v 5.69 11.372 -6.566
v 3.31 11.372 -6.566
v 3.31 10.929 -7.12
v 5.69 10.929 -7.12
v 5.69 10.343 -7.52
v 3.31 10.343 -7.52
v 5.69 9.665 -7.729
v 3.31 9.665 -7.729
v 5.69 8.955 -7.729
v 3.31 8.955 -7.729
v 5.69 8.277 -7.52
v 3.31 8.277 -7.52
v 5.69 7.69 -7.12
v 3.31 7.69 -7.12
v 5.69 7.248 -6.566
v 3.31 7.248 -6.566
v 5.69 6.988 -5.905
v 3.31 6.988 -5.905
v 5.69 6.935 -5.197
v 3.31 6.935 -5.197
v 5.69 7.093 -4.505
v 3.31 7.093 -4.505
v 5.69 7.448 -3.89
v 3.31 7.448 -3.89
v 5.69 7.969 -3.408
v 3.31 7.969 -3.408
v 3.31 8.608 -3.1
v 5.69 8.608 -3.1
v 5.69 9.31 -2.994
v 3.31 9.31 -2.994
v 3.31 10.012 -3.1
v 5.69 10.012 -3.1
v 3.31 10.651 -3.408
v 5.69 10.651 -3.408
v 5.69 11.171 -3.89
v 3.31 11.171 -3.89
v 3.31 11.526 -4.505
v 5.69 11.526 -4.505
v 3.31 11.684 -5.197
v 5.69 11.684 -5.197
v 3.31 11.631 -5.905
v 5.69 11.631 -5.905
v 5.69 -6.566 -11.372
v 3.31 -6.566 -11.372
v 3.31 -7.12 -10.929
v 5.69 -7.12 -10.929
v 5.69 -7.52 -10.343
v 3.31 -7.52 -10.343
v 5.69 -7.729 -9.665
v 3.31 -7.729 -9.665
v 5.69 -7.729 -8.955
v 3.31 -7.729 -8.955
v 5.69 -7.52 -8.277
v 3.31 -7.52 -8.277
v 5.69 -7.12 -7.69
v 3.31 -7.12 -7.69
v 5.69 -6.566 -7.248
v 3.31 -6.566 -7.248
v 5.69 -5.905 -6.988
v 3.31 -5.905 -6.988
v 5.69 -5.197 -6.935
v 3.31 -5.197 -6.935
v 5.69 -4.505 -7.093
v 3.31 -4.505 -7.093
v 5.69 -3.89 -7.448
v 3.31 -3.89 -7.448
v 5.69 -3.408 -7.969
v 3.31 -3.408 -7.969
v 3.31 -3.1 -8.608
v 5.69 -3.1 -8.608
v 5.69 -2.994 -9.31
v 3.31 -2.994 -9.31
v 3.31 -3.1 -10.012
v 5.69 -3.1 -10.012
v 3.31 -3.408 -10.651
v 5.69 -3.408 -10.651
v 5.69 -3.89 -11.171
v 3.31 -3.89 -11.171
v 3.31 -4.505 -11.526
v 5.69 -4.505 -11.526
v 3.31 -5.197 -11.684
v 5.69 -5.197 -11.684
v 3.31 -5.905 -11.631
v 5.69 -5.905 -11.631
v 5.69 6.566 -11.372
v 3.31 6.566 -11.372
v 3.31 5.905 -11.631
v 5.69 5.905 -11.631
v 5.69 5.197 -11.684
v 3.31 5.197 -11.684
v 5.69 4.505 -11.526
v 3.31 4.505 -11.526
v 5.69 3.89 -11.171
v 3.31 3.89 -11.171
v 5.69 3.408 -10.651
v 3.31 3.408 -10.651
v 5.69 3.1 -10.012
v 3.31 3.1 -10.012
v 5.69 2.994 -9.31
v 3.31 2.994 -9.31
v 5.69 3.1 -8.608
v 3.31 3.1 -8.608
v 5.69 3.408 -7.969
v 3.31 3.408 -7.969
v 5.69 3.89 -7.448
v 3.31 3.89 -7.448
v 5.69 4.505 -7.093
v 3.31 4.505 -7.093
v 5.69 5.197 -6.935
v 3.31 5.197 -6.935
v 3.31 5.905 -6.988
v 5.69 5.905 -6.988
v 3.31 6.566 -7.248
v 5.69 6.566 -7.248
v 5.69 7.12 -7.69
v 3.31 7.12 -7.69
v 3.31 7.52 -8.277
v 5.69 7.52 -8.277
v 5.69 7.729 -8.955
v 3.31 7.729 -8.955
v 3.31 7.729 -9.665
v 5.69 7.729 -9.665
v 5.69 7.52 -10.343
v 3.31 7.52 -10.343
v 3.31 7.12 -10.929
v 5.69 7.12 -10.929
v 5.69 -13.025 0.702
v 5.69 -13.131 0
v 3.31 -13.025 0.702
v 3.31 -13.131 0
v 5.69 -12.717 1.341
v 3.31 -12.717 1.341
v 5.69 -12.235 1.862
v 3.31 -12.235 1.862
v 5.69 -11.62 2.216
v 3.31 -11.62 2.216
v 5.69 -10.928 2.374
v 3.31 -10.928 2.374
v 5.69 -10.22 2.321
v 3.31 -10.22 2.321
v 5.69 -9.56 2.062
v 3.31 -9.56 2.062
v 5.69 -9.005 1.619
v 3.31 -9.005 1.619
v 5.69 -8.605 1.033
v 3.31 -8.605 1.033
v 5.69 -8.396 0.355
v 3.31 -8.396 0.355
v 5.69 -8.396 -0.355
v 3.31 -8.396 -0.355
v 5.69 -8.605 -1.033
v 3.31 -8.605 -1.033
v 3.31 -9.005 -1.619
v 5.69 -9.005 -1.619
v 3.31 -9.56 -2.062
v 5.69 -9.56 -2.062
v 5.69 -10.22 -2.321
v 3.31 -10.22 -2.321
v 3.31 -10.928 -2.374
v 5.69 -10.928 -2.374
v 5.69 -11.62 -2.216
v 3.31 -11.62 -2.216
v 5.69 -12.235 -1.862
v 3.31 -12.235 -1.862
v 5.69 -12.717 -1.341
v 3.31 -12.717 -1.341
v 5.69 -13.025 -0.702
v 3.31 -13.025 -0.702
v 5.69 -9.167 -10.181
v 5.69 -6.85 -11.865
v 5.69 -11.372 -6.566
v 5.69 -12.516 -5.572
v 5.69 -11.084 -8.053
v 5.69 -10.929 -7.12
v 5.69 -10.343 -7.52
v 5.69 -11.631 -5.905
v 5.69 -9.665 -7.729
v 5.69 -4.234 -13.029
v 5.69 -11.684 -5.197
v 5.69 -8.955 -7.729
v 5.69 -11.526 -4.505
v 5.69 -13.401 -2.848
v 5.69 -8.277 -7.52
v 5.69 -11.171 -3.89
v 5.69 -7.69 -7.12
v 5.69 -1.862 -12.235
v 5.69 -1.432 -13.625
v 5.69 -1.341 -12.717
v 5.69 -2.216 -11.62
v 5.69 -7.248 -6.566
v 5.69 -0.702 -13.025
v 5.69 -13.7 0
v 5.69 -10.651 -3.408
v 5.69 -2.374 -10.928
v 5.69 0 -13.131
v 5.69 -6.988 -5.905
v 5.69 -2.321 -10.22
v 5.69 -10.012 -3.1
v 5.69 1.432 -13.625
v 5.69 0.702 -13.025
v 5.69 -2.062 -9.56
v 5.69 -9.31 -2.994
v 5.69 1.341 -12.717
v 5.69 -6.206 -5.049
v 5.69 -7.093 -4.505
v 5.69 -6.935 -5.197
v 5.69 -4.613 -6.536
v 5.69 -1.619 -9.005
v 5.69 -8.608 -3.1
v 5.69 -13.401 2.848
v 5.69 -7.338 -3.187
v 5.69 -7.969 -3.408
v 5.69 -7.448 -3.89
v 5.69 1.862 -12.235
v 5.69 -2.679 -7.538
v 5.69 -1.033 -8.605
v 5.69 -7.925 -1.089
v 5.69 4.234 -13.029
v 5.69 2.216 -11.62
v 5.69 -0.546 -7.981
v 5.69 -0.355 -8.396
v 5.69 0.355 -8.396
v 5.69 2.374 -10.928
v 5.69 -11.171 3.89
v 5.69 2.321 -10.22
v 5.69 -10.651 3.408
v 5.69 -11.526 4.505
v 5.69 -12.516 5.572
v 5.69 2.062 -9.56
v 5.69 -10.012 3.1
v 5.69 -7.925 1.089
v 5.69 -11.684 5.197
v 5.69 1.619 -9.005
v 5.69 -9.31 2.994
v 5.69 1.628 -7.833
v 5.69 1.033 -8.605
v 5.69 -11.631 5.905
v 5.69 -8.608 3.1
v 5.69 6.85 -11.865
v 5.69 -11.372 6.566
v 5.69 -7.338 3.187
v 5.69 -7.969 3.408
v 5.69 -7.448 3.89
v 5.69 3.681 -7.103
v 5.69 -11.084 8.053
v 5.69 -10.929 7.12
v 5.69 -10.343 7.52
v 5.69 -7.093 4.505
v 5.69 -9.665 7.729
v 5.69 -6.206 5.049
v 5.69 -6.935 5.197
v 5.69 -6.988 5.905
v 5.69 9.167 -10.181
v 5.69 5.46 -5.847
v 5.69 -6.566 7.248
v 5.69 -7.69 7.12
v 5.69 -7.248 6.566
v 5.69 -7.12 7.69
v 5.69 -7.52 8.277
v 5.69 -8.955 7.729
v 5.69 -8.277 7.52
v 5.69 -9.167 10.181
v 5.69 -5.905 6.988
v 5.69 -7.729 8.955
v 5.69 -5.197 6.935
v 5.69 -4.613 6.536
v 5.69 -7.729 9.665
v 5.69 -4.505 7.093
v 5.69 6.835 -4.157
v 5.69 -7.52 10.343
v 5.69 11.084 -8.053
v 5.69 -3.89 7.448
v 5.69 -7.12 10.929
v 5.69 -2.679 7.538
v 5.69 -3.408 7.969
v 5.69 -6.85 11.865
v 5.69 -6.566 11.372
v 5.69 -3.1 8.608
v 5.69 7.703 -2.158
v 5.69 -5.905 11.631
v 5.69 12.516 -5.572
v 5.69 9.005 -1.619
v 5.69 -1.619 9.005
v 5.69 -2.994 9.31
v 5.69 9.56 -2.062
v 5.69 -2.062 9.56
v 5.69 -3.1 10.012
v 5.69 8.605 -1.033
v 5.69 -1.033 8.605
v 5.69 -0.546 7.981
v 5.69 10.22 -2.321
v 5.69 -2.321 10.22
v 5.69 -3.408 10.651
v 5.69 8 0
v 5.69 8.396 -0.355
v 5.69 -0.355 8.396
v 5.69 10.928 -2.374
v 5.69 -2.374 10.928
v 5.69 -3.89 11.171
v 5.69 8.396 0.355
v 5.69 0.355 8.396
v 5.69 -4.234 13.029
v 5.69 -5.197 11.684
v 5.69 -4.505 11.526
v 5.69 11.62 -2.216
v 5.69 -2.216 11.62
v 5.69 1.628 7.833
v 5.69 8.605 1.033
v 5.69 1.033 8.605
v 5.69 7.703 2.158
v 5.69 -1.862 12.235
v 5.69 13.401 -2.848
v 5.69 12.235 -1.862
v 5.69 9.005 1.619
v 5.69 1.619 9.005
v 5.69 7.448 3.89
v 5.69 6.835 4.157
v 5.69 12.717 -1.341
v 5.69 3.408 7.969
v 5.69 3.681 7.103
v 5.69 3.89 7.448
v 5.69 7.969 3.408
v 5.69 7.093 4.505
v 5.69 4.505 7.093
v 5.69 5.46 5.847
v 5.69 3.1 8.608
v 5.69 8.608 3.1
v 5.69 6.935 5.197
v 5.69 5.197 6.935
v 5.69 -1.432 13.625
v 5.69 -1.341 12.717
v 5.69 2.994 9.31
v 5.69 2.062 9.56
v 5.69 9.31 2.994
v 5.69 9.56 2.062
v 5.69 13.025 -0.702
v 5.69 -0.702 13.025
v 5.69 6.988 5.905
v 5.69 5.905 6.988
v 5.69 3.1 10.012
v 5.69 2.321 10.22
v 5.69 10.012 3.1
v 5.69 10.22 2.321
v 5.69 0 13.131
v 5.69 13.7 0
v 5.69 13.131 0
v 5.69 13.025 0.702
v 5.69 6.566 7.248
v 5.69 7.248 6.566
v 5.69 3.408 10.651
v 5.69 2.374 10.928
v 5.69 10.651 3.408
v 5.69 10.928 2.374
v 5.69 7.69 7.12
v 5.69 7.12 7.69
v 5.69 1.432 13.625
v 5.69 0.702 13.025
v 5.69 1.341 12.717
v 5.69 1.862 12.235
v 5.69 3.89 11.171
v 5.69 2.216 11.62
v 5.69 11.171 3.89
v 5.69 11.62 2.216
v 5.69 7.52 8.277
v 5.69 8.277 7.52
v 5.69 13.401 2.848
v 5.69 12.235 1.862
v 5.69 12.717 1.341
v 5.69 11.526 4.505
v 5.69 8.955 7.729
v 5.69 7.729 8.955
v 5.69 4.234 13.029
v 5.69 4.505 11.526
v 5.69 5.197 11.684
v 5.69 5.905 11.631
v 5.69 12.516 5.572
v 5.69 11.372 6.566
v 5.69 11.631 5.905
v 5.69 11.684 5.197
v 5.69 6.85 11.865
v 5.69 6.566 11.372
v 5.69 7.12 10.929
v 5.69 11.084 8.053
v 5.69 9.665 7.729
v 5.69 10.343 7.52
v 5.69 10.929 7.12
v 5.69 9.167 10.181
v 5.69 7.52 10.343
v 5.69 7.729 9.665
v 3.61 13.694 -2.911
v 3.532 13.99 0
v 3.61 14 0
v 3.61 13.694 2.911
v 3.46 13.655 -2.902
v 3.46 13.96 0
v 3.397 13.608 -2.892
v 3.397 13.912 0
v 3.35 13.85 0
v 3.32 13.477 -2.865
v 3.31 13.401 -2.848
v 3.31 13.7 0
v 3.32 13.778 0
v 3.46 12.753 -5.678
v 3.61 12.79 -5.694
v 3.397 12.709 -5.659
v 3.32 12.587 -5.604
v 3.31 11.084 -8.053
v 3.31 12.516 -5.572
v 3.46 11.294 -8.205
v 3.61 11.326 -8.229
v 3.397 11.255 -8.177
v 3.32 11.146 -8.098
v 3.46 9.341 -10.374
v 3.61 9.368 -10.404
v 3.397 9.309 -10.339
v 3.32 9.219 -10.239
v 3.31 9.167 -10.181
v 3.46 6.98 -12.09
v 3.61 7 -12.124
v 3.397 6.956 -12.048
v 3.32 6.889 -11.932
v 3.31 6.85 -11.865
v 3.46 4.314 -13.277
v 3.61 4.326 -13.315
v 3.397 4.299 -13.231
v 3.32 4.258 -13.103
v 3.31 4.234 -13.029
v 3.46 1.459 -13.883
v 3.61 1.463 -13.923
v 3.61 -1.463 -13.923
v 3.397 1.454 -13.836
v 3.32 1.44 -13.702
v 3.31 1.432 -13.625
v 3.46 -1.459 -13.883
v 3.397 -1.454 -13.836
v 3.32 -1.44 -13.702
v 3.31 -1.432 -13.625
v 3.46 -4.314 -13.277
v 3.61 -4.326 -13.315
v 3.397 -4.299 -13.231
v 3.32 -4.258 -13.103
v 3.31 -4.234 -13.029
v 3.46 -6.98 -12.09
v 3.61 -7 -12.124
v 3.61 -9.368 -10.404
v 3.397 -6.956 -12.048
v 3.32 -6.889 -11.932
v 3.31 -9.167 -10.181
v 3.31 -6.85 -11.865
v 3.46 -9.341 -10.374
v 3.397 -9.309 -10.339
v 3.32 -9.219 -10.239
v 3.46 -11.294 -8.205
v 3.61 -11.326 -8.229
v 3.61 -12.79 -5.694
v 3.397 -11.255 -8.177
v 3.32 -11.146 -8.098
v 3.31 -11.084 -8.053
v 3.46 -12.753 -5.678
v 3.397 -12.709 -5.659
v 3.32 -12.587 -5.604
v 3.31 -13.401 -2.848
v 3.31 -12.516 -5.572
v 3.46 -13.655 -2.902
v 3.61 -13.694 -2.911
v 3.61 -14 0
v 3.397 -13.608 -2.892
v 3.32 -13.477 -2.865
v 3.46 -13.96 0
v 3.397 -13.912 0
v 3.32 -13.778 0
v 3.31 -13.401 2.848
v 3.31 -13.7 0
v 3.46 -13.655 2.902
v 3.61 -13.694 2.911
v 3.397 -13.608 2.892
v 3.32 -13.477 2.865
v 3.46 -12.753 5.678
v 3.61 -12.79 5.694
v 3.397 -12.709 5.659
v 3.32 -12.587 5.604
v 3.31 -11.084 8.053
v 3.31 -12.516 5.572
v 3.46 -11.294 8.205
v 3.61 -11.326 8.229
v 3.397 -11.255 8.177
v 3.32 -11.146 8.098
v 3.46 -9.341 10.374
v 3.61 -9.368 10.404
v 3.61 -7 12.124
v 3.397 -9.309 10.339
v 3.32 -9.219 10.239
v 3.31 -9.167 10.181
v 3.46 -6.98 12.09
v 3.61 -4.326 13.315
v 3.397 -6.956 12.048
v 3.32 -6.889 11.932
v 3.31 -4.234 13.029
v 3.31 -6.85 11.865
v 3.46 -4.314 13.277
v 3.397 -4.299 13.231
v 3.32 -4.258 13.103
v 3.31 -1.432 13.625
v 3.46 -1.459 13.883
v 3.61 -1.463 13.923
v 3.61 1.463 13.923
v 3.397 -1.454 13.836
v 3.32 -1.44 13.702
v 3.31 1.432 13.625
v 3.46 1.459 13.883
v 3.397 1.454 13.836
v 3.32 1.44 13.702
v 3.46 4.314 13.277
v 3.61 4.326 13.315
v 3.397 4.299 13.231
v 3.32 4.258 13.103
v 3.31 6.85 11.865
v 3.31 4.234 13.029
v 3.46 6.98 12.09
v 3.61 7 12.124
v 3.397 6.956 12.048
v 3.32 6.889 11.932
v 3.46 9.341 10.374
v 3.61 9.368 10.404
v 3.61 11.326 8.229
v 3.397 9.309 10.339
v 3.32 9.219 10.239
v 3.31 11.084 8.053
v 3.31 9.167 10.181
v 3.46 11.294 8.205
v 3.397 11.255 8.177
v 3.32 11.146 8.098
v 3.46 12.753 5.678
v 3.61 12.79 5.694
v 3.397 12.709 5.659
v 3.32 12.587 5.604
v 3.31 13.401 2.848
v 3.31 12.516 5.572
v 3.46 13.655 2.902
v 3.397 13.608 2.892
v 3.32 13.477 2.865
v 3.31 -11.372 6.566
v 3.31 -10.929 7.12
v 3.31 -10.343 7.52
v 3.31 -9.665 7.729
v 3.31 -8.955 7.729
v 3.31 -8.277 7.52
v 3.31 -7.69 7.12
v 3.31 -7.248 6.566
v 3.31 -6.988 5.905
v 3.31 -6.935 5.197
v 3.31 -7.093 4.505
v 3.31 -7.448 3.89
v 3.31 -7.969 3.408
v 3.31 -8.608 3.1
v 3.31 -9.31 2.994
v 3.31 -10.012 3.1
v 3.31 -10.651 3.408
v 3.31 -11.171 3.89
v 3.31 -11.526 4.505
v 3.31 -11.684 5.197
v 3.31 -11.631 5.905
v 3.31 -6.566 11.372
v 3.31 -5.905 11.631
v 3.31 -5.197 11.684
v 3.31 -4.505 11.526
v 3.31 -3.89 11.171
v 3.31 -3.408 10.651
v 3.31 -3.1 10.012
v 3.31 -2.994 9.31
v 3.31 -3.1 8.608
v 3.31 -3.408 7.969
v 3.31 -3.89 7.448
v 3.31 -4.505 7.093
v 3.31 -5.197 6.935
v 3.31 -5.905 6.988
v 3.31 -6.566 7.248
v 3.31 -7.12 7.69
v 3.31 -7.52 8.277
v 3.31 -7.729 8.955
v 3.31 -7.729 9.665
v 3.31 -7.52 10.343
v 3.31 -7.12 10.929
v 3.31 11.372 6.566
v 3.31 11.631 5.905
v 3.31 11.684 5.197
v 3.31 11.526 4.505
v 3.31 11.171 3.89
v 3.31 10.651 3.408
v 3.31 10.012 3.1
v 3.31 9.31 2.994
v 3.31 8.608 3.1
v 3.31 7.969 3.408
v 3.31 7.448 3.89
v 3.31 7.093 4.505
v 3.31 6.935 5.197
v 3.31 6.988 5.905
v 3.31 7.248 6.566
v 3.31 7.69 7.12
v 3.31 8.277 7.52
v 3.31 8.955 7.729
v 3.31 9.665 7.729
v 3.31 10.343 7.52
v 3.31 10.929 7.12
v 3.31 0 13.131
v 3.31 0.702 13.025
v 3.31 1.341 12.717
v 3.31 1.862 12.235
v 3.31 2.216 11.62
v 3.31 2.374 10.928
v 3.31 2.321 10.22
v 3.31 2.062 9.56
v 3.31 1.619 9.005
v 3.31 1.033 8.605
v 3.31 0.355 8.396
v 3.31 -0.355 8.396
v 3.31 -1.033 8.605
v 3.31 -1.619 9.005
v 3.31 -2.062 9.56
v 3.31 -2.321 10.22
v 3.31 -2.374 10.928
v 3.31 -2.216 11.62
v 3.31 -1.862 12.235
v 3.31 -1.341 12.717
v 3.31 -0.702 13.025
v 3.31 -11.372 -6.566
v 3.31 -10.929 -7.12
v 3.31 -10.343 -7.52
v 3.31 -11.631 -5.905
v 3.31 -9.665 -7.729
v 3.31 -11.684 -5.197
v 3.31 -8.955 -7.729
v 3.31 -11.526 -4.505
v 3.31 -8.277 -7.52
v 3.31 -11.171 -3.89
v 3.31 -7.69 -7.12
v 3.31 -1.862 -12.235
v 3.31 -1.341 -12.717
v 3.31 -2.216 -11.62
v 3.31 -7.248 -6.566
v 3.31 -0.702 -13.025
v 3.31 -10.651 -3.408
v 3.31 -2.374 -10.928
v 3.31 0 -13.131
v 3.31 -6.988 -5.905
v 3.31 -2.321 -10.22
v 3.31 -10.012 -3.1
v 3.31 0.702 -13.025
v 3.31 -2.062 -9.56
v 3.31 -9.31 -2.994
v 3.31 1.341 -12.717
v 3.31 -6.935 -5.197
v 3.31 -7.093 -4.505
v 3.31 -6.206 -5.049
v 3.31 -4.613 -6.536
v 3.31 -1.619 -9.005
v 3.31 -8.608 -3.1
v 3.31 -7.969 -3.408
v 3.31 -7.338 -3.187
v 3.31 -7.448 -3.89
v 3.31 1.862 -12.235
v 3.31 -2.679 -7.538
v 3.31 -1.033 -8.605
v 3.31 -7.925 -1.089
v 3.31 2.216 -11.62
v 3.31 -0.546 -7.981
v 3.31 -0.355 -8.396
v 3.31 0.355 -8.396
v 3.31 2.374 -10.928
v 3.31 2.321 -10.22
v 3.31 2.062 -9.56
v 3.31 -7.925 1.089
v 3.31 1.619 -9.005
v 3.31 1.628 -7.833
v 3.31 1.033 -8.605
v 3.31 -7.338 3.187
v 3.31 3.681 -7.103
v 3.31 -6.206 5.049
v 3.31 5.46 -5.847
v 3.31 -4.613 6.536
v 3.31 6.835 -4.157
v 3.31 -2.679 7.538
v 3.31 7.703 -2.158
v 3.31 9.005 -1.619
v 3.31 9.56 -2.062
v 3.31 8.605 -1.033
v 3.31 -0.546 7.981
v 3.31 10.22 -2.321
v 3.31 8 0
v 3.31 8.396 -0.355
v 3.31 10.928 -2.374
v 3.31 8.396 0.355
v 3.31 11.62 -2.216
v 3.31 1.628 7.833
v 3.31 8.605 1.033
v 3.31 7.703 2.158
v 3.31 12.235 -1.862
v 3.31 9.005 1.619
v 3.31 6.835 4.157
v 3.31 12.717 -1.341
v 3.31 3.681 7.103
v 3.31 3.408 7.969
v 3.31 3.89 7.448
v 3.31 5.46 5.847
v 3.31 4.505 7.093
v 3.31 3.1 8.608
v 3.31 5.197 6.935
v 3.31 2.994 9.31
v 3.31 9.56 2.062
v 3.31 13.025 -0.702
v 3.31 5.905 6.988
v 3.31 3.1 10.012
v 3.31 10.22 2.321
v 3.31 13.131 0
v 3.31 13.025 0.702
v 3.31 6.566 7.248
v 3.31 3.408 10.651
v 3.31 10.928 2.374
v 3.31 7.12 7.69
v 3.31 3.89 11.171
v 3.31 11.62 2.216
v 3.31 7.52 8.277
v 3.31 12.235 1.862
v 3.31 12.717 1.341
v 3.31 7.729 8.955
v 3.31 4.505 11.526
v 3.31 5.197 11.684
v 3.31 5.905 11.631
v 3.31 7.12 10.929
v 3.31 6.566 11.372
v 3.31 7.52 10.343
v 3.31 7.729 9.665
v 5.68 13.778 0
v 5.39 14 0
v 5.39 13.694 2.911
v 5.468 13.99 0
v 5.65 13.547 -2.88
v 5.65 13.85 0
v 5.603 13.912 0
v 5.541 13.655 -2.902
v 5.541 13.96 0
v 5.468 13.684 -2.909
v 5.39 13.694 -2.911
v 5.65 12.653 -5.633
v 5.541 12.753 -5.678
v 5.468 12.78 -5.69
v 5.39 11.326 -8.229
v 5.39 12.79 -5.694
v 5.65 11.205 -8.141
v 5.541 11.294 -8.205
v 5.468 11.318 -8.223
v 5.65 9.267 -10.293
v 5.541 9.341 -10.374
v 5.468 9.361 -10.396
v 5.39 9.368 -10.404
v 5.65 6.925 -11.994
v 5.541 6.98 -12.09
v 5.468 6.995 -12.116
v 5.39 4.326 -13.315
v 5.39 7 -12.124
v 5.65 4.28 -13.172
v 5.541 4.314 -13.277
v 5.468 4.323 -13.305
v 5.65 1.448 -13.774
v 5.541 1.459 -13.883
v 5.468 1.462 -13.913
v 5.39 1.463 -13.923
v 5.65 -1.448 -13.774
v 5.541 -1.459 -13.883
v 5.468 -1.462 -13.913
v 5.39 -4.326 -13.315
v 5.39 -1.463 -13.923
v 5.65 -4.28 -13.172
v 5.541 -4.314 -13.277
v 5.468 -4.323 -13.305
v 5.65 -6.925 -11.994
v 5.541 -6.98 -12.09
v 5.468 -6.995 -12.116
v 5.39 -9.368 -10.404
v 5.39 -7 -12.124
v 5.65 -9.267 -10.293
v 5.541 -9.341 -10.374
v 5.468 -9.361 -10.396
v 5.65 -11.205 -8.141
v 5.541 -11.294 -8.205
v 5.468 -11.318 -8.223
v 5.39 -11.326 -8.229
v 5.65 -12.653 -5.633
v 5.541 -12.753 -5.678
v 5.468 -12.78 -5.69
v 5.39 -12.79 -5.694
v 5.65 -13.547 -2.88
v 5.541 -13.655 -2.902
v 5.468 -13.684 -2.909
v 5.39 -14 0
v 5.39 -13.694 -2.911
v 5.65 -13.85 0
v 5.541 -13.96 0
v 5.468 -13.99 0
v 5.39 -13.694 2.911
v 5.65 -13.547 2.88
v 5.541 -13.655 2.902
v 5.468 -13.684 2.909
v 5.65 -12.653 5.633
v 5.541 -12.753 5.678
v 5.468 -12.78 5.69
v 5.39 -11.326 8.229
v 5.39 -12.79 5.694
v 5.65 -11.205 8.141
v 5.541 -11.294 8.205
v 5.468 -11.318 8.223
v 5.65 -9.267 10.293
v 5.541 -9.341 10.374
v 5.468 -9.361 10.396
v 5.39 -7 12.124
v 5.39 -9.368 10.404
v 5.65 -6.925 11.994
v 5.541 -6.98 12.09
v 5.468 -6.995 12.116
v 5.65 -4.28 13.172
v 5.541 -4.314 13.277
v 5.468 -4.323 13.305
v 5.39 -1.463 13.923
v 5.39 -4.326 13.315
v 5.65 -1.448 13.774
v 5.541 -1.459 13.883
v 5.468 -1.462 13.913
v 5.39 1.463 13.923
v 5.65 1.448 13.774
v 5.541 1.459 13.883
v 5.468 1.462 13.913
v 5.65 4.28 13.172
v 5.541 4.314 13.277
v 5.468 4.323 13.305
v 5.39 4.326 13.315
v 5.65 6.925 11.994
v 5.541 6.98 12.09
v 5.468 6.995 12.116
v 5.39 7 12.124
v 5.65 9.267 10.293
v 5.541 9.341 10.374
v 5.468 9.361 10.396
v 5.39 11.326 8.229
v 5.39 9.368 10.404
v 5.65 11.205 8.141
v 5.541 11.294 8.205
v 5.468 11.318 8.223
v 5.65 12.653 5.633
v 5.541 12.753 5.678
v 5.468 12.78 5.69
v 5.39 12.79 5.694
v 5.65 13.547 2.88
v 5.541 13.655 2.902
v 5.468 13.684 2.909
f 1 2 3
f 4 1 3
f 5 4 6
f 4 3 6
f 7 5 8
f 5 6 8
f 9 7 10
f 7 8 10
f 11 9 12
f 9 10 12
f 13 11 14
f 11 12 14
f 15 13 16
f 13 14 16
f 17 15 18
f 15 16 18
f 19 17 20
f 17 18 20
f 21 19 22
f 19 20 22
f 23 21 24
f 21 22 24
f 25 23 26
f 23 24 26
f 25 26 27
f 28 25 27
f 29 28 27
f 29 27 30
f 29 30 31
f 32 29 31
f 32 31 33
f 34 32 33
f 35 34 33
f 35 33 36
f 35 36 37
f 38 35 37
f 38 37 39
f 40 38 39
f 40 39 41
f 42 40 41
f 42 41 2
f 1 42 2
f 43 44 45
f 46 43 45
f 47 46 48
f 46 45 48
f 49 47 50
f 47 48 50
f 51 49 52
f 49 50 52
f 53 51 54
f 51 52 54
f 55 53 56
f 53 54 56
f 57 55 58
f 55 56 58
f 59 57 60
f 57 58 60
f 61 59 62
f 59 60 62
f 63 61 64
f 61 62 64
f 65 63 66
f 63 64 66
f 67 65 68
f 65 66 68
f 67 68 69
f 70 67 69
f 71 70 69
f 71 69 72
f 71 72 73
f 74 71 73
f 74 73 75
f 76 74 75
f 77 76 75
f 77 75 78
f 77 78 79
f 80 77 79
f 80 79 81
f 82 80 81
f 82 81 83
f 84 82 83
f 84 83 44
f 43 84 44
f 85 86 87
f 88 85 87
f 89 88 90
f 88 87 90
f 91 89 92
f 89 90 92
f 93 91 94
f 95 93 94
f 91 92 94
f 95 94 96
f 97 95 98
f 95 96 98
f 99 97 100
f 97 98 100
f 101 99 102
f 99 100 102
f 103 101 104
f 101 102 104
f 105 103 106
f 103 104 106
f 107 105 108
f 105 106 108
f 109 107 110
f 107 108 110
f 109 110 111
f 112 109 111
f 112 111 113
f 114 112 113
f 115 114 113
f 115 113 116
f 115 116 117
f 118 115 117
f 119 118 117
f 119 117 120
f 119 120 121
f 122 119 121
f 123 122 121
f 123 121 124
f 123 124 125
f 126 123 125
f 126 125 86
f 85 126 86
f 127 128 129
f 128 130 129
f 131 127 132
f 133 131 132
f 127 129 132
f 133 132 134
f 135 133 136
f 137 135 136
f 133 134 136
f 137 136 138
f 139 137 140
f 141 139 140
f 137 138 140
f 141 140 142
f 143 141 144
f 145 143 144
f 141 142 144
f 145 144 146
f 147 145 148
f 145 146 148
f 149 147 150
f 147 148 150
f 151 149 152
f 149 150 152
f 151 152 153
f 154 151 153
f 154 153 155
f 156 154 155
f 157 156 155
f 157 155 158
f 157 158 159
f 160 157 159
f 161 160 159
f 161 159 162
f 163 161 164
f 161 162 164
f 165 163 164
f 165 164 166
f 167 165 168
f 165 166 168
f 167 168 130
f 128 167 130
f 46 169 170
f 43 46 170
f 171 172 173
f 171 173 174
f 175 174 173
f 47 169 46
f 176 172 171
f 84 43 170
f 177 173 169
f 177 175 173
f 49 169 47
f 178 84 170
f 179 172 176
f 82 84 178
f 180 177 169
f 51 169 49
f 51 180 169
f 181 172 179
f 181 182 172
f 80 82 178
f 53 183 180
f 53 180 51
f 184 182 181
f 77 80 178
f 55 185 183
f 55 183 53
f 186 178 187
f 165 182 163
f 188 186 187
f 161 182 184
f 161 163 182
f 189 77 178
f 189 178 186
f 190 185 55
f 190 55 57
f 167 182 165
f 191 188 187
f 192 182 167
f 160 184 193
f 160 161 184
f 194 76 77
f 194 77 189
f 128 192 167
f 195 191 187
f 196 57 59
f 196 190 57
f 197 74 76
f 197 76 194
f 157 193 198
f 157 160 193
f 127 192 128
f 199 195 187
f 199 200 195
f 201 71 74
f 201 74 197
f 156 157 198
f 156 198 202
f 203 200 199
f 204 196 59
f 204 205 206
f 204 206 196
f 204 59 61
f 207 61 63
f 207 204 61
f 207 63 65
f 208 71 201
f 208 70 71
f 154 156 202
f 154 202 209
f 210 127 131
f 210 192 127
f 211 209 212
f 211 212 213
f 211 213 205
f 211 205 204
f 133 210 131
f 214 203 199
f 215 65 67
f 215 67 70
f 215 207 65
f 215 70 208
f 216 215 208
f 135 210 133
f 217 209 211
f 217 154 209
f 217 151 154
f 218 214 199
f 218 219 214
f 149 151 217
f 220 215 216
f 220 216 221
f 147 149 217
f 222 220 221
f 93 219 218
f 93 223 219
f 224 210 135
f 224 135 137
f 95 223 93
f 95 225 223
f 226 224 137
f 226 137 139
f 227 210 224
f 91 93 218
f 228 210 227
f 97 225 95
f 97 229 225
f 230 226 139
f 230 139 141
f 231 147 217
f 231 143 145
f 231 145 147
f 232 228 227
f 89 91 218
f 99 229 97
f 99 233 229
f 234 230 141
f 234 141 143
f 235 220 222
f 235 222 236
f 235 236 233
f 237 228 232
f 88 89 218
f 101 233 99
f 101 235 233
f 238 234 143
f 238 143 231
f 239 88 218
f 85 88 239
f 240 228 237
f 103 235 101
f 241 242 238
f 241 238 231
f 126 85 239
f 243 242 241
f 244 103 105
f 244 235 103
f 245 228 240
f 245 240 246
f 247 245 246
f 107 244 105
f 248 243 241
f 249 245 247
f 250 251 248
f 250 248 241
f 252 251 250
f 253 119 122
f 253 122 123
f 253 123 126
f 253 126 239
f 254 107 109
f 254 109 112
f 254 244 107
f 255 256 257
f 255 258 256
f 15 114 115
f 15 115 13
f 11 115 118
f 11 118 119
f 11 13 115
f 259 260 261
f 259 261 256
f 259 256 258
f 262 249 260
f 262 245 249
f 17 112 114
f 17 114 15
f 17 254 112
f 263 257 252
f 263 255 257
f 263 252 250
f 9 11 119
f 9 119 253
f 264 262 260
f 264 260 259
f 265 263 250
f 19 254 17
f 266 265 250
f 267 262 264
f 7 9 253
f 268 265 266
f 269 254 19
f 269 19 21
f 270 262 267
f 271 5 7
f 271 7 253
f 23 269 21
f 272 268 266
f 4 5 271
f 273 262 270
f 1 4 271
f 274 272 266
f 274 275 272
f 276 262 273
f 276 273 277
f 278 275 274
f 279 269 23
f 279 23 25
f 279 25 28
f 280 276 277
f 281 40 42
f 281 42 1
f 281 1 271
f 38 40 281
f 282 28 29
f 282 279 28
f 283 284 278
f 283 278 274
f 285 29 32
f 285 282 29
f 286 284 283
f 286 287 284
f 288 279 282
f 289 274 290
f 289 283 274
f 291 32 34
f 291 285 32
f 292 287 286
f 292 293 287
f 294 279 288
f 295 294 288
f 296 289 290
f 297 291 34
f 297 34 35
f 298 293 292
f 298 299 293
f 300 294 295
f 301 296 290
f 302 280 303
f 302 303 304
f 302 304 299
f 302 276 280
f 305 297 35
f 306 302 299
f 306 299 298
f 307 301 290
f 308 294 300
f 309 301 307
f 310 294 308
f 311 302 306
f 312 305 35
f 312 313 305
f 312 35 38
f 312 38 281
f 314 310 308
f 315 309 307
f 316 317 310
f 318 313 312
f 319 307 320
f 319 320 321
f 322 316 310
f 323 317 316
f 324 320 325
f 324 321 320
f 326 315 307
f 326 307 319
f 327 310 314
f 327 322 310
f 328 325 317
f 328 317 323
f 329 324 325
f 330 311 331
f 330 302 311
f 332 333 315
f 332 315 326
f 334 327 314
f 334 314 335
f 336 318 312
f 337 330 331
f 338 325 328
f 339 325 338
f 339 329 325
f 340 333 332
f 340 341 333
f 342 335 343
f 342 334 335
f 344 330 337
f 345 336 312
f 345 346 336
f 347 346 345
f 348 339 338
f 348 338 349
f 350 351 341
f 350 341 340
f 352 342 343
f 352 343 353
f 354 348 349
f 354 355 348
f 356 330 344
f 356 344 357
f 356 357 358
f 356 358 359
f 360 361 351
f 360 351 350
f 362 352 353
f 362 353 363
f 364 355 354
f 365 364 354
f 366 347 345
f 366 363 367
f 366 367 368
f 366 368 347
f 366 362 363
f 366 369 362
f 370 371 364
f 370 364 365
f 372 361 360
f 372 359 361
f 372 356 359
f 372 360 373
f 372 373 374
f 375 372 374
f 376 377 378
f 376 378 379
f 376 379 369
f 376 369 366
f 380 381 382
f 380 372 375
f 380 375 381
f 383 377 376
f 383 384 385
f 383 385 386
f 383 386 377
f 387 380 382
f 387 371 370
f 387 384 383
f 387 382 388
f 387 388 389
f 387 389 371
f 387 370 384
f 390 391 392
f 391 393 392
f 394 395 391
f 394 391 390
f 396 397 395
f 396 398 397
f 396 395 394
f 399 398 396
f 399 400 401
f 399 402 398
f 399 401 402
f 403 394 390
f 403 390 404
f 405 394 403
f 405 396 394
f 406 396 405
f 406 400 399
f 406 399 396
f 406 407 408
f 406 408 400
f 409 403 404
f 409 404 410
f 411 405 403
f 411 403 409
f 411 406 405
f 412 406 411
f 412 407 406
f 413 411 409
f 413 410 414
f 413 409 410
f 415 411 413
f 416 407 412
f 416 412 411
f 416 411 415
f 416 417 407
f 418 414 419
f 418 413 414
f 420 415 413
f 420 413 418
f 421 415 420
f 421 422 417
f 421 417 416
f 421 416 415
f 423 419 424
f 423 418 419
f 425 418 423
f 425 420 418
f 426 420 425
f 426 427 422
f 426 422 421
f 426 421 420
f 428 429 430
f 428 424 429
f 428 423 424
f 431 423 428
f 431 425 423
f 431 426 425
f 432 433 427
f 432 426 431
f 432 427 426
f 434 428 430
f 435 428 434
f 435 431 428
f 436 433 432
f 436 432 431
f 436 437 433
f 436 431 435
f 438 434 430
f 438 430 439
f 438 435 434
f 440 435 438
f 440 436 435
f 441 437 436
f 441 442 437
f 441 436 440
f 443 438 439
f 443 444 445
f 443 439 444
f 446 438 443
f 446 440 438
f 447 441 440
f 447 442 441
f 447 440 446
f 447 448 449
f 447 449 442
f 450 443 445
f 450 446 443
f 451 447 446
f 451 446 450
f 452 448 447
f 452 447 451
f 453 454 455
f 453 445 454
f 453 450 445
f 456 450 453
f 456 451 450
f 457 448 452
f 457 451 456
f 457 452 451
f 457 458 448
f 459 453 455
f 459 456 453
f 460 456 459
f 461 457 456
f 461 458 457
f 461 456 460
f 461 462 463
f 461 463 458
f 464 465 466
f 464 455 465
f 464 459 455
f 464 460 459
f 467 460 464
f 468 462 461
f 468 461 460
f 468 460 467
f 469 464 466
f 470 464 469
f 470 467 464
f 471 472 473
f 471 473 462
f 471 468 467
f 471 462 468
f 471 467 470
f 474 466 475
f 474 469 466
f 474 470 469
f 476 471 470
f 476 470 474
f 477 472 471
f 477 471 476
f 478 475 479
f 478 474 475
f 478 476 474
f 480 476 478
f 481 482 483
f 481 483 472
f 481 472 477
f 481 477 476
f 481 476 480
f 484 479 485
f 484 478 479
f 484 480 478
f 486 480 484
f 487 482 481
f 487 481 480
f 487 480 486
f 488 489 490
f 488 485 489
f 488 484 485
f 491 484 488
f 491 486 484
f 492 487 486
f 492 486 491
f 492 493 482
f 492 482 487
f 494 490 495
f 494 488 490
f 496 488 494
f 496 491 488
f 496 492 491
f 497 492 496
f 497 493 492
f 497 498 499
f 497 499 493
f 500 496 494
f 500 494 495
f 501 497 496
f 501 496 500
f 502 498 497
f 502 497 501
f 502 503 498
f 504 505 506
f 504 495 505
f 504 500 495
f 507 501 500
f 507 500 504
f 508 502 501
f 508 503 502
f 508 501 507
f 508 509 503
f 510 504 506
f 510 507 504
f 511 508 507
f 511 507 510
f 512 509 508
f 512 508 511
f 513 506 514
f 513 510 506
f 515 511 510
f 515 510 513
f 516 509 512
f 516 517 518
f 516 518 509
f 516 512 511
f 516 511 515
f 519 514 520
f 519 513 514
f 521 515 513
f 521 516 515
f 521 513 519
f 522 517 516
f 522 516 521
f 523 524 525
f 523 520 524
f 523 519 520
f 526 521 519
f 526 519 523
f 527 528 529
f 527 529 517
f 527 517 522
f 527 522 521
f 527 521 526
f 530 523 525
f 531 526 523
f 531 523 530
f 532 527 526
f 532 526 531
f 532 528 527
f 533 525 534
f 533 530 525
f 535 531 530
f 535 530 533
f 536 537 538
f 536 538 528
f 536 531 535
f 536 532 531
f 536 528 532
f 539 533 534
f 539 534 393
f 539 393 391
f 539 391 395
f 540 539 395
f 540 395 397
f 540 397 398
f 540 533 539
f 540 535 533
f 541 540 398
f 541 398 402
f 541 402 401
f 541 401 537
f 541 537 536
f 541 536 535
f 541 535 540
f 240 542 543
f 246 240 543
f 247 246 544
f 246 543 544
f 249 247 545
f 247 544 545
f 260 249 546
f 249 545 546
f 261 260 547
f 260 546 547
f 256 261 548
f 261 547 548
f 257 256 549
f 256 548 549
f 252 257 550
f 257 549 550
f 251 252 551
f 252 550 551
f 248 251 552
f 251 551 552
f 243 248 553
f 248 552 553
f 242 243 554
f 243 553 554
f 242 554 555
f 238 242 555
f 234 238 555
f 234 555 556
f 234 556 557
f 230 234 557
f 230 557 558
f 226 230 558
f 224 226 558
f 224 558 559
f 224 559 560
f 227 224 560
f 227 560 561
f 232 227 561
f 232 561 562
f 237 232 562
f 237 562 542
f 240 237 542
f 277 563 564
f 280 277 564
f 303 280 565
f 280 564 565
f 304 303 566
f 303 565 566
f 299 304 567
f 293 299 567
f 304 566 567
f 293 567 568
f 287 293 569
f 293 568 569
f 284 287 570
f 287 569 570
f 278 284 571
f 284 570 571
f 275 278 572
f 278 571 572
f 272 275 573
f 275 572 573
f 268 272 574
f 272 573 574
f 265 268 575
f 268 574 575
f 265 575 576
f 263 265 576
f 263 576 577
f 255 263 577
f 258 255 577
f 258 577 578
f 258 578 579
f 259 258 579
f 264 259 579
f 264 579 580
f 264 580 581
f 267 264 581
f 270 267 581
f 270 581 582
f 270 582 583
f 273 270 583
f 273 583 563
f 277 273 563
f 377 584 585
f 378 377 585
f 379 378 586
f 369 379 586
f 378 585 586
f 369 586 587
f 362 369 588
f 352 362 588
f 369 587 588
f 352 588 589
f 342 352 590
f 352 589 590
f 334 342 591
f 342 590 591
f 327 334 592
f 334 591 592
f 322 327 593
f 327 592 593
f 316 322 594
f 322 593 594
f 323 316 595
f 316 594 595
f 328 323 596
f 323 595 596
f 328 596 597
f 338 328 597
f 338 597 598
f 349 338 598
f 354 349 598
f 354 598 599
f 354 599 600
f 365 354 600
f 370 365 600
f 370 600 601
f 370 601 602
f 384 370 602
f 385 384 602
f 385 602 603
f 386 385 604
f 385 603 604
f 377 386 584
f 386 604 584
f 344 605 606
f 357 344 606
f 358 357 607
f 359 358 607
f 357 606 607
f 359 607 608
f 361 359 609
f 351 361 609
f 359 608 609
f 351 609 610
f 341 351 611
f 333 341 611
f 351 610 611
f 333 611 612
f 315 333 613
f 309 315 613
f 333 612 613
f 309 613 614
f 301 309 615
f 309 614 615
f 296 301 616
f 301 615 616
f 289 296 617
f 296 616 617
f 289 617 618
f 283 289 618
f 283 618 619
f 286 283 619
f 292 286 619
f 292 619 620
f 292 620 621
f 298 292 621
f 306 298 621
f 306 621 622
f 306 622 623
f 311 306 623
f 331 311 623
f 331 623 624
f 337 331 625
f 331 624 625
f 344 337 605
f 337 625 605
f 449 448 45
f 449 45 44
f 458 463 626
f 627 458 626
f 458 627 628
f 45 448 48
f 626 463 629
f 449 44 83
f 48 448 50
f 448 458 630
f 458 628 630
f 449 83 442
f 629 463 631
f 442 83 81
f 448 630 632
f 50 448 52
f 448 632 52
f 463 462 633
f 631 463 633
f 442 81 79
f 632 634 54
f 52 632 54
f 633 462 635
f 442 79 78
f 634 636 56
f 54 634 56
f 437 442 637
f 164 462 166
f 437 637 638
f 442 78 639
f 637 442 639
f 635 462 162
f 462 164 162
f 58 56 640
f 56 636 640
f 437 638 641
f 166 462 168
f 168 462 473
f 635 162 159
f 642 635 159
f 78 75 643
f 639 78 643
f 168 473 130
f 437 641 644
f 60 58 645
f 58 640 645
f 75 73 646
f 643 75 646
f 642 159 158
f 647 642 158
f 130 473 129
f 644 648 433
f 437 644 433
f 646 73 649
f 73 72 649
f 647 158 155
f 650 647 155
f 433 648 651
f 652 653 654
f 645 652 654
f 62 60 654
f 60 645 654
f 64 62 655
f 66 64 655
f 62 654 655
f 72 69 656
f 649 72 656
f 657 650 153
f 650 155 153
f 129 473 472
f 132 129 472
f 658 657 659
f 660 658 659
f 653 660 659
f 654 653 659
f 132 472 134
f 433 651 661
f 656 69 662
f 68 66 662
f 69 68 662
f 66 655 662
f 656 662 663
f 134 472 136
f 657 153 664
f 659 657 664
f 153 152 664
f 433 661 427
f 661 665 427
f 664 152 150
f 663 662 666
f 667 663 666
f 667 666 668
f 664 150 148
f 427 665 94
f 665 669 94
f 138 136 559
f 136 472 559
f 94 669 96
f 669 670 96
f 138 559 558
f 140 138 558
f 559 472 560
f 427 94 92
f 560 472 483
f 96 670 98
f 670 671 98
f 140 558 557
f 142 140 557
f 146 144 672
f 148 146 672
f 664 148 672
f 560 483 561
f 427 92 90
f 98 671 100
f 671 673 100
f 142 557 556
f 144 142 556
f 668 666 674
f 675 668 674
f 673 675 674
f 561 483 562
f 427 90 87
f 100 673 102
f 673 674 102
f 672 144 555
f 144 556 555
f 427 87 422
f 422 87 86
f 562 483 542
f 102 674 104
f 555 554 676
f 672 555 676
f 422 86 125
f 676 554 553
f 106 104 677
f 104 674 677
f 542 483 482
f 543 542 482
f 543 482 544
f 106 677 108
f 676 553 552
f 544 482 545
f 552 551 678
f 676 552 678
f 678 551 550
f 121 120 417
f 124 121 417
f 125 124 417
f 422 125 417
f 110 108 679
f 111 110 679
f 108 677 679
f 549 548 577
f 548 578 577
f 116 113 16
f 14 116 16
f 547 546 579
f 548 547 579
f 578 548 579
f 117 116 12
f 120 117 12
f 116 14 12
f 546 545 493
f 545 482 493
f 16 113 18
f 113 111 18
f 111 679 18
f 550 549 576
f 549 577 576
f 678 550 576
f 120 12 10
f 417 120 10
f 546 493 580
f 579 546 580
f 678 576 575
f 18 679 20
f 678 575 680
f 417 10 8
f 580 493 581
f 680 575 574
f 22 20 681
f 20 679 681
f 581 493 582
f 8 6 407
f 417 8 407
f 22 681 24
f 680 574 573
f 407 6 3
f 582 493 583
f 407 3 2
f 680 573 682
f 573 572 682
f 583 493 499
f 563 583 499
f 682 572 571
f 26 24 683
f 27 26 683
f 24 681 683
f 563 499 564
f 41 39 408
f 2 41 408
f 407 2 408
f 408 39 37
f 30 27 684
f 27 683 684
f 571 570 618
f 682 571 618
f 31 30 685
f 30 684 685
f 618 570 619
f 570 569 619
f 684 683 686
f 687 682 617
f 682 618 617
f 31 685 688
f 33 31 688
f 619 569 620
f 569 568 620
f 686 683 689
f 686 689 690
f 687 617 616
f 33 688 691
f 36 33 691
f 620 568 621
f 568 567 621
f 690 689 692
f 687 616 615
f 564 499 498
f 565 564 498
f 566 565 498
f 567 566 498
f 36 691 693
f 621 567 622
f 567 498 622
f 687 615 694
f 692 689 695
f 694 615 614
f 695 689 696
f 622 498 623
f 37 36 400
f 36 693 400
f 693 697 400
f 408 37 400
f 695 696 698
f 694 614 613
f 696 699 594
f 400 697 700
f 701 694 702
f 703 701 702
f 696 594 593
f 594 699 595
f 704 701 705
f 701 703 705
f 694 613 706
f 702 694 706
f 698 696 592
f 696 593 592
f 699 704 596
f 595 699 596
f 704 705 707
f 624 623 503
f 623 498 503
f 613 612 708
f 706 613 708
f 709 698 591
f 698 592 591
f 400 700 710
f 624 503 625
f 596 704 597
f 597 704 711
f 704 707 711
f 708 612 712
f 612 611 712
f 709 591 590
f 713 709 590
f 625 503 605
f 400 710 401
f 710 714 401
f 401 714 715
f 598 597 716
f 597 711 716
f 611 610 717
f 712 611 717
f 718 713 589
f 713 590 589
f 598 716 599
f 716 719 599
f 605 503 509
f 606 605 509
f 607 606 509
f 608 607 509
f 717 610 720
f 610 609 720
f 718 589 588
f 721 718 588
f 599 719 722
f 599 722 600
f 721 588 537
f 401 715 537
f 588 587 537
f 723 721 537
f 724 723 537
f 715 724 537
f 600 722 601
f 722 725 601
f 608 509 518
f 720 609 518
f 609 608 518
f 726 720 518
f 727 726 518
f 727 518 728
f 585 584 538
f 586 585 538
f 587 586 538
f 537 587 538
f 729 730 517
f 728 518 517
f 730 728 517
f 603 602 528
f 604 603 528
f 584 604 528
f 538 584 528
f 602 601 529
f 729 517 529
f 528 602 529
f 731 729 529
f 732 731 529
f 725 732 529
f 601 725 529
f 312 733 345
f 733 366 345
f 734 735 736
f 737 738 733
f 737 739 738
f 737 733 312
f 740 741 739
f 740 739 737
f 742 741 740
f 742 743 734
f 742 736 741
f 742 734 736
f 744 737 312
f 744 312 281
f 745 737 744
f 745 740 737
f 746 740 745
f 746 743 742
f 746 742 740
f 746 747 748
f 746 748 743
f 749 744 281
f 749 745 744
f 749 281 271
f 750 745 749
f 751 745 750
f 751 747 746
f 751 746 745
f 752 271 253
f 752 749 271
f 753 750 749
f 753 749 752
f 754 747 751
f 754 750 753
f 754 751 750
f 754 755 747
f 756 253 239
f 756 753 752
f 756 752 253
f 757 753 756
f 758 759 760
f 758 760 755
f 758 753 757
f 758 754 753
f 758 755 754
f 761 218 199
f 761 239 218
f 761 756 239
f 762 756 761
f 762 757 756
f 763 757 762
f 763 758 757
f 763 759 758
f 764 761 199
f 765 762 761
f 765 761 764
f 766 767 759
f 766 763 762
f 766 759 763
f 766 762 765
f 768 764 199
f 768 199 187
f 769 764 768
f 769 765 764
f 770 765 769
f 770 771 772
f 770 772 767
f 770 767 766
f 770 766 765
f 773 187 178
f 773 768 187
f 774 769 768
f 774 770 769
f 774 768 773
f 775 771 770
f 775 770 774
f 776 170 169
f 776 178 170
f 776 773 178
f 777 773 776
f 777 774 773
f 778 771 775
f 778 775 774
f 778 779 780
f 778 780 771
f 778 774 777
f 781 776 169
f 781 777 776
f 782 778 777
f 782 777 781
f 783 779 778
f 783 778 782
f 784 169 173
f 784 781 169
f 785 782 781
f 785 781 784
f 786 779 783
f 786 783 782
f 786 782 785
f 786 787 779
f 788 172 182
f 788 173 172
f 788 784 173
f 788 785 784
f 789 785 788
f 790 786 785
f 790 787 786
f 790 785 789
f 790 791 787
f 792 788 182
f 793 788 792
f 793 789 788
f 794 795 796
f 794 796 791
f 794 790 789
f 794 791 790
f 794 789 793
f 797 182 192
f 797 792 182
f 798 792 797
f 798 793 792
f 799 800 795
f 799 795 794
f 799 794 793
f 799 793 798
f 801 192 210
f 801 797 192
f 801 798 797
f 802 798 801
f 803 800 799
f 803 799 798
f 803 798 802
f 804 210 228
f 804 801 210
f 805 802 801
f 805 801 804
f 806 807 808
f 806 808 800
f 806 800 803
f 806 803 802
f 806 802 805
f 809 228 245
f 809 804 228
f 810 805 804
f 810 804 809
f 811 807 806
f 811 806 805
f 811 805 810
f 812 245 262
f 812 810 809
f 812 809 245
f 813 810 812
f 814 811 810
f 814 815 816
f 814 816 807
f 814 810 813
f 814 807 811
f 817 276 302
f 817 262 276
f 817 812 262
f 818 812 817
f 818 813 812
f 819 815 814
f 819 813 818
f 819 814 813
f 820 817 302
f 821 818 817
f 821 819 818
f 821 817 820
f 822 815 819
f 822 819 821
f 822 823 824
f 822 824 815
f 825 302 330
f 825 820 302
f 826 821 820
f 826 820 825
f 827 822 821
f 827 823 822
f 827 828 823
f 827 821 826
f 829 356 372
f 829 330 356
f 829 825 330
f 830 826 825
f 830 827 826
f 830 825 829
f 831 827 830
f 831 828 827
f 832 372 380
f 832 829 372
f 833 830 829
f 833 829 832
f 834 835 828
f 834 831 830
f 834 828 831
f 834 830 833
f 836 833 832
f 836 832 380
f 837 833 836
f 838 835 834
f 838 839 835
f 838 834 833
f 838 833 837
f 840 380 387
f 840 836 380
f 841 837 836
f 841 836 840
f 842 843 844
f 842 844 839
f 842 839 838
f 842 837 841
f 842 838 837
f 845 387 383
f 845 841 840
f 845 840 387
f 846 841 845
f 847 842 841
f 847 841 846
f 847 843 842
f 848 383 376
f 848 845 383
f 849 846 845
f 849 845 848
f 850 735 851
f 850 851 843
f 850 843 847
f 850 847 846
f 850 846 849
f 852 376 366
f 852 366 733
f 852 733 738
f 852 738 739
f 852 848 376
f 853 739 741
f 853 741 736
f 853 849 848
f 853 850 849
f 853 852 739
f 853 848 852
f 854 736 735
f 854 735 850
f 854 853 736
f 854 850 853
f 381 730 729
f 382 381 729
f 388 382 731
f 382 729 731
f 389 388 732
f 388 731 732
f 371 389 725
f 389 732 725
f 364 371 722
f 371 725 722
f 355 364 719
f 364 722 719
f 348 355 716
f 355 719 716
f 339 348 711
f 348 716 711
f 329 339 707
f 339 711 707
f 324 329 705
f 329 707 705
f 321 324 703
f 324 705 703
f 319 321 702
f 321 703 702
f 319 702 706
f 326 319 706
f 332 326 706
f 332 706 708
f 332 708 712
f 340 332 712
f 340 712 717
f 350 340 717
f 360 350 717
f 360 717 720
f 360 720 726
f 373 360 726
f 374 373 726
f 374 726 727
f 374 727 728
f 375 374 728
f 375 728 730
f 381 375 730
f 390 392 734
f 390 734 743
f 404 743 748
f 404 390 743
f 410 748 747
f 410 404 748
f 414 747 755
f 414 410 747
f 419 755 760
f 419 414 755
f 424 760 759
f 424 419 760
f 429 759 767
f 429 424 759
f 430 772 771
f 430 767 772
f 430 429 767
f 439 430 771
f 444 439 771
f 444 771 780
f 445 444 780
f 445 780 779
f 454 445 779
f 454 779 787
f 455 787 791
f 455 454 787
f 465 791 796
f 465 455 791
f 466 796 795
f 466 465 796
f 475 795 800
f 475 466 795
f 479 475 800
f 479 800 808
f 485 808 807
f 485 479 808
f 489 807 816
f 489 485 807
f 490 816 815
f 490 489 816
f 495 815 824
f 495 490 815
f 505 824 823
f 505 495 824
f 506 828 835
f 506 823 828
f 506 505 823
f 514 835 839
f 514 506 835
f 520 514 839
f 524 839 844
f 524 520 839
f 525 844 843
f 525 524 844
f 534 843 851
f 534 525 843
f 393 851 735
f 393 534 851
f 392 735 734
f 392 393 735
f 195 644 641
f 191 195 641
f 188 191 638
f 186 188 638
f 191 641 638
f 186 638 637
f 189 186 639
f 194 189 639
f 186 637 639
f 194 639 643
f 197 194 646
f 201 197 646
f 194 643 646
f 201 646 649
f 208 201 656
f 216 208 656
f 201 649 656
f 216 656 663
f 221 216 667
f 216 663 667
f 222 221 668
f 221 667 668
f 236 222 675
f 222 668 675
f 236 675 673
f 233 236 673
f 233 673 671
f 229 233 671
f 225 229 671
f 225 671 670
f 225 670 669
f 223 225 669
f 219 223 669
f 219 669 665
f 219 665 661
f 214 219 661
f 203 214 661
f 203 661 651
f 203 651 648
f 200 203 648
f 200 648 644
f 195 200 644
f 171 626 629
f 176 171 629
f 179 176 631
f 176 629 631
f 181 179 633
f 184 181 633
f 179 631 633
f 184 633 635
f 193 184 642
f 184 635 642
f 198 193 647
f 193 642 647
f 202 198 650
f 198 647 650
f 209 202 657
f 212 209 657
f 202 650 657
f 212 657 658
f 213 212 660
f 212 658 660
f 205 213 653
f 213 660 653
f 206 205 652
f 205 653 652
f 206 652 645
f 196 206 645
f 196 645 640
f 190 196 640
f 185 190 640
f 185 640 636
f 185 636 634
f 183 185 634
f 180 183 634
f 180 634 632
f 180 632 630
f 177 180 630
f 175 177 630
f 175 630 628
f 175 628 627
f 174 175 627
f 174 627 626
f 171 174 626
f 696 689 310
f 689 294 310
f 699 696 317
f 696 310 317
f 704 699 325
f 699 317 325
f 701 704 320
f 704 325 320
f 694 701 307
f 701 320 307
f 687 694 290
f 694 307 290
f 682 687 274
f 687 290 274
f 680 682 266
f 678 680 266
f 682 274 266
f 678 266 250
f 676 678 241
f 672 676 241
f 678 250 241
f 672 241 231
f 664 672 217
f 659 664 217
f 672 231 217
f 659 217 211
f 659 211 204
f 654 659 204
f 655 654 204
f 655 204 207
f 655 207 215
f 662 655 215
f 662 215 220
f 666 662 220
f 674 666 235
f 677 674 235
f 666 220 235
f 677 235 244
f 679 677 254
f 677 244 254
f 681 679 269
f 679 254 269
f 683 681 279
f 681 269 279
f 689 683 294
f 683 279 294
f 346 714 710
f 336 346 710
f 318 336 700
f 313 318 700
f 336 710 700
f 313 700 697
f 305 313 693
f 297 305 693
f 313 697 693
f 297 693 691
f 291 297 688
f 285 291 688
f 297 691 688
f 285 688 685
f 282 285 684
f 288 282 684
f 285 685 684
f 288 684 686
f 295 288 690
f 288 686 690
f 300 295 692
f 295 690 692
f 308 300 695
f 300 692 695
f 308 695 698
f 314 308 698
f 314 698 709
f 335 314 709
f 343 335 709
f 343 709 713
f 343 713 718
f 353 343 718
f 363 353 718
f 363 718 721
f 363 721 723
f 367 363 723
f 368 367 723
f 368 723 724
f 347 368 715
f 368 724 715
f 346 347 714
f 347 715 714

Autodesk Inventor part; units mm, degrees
ref_plane "YZ Plane" through (0, 0, 0) normal (1, 0, 0) x (0, 1, 0)
ref_plane "XZ Plane" through (0, 0, 0) normal (0, 1, 0) x (-1, 0, 0)
ref_plane "XY Plane" through (0, 0, 0) normal (0, 0, 1) x (1, 0, 0)
sketch "Sketch_1" plane through (0, 0, 0) normal (0, 0, 1) x (1, 0, 0)
  line L0 (5.6905, 0) -> (3.3095, 0)
  line L1 (3.3095, 13.7) -> (3.3095, 8)
  line L2 (3.3095, 8) -> (5.6905, 8)
  line L3 (5.6905, 8) -> (5.6905, 13.7)
  arc A0 (5.6905, 13.7) -> (5.3905, 14) centre (5.3905, 13.7) ccw
  line L4 (5.3905, 14) -> (3.6095, 14)
  arc A1 (3.6095, 14) -> (3.3095, 13.7) centre (3.6095, 13.7) ccw
revolve "Revolution1" add sketch "Sketch_1" angle 360 about axis through (5.6905, 0, 0) along (1, 0, 0)
sketch "Sketch_2" plane through (0, 0, 0) normal (1, 0, 0) x (0, 1, 0)
  circle A0 centre (10.75, 0) radius 2.381
extrude "Extrusion1" cut sketch "Sketch_2" along normal blind 9
pattern_circular "Circular Pattern1" count 12 over 360 about axis through (0, 0, 0) along (1, 0, 0) of "Extrusion1"
properties part number "SKF_51102_PART1"
